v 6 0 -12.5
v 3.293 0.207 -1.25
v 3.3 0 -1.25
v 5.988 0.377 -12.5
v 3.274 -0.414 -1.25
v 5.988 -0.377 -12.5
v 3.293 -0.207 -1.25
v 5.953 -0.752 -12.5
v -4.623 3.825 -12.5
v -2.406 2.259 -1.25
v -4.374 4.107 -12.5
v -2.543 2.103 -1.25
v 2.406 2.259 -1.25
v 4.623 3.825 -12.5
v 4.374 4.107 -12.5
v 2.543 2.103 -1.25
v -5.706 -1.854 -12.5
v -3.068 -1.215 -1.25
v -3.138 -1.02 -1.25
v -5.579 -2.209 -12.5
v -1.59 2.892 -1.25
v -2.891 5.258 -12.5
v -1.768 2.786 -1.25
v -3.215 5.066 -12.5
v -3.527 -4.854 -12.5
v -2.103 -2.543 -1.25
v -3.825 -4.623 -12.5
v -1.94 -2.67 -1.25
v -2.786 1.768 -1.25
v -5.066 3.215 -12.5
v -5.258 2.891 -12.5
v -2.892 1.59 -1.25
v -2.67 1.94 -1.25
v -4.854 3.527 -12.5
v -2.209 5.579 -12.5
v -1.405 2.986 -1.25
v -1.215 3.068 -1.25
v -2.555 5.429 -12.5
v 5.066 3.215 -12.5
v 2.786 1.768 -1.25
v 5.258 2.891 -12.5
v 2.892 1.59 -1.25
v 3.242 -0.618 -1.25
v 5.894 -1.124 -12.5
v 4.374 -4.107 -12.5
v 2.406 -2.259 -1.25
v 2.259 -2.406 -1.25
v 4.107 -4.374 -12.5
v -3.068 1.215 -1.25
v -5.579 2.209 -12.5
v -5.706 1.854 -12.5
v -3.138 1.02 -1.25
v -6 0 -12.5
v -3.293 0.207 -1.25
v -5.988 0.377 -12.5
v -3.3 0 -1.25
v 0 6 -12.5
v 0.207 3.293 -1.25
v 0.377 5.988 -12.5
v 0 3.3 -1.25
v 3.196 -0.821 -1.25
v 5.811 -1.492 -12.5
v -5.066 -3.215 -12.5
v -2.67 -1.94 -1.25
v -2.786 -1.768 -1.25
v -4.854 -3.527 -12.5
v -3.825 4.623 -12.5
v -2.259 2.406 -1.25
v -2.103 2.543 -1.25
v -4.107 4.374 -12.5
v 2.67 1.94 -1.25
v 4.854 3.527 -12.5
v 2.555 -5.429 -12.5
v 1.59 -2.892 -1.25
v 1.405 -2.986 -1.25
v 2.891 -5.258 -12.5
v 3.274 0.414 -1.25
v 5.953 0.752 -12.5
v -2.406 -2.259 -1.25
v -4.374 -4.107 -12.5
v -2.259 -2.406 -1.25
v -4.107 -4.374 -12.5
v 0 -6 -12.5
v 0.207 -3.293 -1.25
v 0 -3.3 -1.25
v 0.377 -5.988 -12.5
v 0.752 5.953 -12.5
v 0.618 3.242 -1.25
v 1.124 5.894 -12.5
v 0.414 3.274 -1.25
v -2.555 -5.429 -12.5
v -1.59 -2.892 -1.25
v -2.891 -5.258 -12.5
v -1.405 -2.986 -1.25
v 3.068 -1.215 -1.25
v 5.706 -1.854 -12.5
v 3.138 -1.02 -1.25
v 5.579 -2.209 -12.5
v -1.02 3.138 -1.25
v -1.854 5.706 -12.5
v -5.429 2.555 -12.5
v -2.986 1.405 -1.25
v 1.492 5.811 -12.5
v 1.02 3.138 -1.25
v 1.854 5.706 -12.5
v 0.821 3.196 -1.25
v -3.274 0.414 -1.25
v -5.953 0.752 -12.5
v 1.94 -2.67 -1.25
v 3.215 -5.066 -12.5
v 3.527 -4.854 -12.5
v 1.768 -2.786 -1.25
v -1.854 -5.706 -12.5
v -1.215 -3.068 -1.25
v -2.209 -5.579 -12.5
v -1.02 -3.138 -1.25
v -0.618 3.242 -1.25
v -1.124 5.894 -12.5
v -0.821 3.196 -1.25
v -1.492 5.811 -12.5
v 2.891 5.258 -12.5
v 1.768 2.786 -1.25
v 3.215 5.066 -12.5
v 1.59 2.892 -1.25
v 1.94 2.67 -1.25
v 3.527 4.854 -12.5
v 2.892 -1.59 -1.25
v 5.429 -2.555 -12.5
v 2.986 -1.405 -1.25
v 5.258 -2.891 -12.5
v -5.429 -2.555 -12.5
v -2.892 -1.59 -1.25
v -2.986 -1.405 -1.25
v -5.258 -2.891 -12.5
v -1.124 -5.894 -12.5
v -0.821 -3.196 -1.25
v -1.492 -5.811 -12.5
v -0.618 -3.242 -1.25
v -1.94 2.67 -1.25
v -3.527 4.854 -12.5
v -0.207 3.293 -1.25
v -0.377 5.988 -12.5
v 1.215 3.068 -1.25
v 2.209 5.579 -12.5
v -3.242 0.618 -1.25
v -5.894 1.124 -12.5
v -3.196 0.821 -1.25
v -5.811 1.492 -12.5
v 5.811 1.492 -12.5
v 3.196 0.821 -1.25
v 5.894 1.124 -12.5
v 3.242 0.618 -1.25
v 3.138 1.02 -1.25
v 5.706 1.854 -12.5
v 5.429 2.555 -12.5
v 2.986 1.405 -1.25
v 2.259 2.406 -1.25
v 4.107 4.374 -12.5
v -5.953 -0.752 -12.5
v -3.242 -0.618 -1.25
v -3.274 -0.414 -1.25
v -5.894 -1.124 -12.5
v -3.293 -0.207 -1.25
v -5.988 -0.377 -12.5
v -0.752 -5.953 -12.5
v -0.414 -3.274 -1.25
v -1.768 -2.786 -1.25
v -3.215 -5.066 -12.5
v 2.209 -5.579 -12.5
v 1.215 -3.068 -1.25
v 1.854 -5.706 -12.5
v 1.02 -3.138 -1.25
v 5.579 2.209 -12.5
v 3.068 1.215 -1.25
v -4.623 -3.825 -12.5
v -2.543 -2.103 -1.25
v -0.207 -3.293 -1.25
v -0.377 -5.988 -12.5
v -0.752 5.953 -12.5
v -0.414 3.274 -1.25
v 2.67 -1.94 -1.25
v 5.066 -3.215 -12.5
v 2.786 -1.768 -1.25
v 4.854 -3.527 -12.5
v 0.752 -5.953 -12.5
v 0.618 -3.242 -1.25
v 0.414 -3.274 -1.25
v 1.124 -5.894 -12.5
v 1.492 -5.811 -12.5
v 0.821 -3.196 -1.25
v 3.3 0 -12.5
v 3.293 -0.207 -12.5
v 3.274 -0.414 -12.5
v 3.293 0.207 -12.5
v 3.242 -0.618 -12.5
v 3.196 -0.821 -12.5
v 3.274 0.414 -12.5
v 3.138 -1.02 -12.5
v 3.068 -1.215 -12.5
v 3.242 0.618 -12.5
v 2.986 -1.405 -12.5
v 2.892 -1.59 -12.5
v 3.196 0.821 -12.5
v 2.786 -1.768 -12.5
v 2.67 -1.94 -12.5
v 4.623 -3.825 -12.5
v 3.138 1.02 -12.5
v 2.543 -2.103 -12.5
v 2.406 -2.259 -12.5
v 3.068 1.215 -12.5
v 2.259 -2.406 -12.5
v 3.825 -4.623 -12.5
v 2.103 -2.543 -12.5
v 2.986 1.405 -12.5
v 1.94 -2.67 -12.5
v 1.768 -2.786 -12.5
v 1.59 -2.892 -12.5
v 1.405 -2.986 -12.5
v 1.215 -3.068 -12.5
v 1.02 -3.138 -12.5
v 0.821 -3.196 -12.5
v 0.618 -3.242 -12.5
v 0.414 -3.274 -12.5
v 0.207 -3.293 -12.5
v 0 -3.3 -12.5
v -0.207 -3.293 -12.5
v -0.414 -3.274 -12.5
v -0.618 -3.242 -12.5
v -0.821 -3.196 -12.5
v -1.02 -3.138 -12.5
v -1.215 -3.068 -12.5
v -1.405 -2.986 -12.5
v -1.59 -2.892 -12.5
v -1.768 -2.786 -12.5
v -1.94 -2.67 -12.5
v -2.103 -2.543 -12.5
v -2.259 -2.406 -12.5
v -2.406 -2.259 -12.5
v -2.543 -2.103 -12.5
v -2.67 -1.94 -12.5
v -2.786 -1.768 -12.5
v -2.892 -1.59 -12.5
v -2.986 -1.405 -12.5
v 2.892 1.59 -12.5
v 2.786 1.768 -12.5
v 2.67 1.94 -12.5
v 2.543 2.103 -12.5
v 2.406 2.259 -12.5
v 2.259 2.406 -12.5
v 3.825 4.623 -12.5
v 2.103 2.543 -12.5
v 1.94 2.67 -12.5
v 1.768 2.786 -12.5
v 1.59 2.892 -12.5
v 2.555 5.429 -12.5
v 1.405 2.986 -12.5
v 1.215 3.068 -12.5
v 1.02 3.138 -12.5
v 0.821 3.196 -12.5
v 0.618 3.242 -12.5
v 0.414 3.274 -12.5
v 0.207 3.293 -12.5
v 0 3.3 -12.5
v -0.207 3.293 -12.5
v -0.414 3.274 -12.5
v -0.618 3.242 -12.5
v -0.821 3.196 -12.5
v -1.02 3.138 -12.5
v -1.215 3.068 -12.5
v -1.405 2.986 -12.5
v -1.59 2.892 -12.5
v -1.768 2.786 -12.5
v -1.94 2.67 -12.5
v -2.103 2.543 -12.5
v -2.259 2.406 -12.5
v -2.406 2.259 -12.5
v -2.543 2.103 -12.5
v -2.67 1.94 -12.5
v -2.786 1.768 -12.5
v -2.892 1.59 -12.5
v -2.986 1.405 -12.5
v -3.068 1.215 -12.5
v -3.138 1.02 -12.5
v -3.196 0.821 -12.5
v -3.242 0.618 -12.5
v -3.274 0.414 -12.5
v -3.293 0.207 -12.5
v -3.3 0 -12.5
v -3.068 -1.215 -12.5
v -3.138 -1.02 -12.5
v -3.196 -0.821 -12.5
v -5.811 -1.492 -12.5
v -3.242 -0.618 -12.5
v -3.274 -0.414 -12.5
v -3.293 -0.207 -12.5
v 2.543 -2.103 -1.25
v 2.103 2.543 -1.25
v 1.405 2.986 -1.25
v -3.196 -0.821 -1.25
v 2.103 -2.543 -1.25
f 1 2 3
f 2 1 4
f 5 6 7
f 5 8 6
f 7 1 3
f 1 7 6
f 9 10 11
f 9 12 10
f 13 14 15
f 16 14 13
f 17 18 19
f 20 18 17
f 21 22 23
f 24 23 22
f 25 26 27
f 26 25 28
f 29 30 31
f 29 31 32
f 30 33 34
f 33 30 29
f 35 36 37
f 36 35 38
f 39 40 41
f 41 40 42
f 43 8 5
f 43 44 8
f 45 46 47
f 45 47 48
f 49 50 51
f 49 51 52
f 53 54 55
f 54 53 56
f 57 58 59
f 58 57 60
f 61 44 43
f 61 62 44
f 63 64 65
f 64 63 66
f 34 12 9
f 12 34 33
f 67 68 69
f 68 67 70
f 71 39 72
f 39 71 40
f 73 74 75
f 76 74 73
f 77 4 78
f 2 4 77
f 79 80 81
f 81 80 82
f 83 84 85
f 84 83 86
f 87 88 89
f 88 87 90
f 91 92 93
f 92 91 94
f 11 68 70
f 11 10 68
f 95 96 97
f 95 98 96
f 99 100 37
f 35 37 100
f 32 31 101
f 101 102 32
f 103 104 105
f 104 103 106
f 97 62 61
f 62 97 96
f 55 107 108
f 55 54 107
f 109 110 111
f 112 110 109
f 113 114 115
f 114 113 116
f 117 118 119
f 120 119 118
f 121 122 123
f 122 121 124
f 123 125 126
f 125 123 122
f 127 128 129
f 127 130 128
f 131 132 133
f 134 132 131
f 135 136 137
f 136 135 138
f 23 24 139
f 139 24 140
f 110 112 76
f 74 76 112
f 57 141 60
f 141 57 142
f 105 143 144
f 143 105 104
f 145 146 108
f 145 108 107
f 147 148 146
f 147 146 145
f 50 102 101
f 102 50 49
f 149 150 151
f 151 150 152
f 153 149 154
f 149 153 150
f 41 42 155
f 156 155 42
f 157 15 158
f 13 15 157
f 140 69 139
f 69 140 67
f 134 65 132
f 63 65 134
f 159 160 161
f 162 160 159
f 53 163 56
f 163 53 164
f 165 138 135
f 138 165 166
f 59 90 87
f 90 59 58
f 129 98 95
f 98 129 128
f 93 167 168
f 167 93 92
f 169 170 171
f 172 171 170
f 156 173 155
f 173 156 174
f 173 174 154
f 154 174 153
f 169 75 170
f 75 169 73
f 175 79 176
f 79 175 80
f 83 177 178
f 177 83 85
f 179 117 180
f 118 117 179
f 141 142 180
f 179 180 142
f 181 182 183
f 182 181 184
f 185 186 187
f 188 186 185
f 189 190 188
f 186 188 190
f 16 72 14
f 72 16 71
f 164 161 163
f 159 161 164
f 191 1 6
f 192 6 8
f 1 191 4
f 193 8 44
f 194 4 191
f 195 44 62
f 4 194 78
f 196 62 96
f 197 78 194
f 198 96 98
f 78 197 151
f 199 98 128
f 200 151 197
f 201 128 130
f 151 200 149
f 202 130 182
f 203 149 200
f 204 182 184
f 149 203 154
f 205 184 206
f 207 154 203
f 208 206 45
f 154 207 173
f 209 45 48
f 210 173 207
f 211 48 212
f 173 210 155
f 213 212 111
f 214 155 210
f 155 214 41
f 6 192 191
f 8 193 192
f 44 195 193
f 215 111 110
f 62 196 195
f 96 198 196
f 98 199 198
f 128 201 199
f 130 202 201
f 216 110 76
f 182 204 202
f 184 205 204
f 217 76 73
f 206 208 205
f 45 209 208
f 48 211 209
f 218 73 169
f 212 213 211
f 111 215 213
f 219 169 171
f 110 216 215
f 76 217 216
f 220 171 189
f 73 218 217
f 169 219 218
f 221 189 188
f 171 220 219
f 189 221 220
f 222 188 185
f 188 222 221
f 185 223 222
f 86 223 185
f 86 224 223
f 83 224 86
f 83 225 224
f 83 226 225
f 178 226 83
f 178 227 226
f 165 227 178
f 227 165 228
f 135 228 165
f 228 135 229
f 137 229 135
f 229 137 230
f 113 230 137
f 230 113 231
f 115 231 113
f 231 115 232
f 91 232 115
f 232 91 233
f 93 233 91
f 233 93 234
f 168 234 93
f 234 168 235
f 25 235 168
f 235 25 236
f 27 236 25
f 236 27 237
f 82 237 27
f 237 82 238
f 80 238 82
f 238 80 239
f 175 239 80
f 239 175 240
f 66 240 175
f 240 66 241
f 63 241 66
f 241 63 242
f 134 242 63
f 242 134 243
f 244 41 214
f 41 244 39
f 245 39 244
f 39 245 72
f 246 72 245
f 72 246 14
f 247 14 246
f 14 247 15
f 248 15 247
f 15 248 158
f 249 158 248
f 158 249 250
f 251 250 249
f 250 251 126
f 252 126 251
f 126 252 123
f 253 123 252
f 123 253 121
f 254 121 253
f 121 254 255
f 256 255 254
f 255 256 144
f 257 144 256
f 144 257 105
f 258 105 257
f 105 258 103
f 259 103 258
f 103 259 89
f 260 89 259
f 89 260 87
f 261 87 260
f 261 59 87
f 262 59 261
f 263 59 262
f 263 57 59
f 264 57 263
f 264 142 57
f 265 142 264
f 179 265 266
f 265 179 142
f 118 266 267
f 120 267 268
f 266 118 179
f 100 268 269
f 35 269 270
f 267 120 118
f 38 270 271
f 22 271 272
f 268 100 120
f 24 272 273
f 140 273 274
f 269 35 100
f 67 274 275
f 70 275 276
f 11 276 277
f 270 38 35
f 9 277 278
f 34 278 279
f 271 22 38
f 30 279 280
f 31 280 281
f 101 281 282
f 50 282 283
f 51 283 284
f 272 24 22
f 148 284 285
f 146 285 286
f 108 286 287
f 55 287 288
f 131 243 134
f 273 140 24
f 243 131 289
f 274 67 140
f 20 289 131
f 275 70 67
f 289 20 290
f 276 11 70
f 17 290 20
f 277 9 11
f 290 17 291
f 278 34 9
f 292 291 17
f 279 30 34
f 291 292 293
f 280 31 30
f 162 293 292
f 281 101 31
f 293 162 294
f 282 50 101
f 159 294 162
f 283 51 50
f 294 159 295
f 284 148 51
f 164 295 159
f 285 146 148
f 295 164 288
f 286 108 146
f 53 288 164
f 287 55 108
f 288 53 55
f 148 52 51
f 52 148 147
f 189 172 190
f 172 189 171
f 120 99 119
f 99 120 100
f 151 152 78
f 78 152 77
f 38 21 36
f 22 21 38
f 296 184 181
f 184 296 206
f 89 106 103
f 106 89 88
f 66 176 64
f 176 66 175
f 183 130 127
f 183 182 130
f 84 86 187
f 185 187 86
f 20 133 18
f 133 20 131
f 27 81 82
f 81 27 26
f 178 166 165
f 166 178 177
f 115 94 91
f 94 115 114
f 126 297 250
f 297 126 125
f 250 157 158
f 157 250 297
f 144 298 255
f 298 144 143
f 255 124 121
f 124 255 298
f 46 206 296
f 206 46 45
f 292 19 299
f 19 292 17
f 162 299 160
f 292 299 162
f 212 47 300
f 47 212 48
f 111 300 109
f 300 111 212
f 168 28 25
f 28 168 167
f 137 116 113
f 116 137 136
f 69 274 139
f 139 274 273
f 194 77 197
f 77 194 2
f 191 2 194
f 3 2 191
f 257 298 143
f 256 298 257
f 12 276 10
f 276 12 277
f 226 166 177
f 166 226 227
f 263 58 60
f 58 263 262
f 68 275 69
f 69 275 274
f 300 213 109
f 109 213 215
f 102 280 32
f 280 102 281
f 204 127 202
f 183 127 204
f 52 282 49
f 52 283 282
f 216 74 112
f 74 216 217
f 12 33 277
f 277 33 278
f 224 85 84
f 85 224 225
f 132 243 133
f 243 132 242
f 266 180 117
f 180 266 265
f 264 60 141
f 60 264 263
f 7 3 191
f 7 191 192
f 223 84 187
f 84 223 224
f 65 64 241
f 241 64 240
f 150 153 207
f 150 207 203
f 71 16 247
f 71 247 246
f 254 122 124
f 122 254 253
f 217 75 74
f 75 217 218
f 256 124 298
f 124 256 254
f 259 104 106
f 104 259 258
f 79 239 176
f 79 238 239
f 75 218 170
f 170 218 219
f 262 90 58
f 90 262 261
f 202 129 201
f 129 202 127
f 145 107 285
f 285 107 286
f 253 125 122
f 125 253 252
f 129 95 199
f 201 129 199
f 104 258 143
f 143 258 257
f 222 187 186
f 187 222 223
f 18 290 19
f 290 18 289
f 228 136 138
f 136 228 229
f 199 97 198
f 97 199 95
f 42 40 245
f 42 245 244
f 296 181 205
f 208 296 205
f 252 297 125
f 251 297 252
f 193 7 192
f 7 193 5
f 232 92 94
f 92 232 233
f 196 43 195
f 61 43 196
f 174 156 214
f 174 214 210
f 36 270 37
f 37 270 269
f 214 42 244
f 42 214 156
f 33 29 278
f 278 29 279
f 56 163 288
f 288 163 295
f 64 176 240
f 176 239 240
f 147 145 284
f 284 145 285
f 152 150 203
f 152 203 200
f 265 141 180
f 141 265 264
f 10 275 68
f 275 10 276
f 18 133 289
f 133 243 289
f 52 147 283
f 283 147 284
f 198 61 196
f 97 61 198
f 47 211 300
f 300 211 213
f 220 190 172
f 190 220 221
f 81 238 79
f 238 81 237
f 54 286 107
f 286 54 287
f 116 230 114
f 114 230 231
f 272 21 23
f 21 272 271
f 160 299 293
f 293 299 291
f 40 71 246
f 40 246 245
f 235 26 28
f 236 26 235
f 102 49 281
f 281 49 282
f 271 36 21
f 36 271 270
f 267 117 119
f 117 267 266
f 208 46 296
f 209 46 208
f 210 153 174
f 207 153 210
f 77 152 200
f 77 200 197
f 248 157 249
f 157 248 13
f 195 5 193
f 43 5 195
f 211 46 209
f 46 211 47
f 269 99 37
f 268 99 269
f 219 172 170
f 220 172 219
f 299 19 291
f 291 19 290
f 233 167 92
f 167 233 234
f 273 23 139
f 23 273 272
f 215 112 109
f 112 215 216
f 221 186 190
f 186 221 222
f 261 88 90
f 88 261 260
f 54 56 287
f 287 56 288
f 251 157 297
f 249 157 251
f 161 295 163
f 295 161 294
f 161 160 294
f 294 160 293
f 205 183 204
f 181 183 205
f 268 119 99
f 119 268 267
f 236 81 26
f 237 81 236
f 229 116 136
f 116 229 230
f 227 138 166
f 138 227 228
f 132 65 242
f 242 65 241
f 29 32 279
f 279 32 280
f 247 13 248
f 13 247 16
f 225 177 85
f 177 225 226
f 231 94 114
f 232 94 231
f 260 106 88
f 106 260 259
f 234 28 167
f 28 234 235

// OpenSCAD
difference(){
    cylinder(  25,    6,    0,        true, $fn=100);
    cylinder(  27,    3.3,    3.3,        true, $fn=100);
}
